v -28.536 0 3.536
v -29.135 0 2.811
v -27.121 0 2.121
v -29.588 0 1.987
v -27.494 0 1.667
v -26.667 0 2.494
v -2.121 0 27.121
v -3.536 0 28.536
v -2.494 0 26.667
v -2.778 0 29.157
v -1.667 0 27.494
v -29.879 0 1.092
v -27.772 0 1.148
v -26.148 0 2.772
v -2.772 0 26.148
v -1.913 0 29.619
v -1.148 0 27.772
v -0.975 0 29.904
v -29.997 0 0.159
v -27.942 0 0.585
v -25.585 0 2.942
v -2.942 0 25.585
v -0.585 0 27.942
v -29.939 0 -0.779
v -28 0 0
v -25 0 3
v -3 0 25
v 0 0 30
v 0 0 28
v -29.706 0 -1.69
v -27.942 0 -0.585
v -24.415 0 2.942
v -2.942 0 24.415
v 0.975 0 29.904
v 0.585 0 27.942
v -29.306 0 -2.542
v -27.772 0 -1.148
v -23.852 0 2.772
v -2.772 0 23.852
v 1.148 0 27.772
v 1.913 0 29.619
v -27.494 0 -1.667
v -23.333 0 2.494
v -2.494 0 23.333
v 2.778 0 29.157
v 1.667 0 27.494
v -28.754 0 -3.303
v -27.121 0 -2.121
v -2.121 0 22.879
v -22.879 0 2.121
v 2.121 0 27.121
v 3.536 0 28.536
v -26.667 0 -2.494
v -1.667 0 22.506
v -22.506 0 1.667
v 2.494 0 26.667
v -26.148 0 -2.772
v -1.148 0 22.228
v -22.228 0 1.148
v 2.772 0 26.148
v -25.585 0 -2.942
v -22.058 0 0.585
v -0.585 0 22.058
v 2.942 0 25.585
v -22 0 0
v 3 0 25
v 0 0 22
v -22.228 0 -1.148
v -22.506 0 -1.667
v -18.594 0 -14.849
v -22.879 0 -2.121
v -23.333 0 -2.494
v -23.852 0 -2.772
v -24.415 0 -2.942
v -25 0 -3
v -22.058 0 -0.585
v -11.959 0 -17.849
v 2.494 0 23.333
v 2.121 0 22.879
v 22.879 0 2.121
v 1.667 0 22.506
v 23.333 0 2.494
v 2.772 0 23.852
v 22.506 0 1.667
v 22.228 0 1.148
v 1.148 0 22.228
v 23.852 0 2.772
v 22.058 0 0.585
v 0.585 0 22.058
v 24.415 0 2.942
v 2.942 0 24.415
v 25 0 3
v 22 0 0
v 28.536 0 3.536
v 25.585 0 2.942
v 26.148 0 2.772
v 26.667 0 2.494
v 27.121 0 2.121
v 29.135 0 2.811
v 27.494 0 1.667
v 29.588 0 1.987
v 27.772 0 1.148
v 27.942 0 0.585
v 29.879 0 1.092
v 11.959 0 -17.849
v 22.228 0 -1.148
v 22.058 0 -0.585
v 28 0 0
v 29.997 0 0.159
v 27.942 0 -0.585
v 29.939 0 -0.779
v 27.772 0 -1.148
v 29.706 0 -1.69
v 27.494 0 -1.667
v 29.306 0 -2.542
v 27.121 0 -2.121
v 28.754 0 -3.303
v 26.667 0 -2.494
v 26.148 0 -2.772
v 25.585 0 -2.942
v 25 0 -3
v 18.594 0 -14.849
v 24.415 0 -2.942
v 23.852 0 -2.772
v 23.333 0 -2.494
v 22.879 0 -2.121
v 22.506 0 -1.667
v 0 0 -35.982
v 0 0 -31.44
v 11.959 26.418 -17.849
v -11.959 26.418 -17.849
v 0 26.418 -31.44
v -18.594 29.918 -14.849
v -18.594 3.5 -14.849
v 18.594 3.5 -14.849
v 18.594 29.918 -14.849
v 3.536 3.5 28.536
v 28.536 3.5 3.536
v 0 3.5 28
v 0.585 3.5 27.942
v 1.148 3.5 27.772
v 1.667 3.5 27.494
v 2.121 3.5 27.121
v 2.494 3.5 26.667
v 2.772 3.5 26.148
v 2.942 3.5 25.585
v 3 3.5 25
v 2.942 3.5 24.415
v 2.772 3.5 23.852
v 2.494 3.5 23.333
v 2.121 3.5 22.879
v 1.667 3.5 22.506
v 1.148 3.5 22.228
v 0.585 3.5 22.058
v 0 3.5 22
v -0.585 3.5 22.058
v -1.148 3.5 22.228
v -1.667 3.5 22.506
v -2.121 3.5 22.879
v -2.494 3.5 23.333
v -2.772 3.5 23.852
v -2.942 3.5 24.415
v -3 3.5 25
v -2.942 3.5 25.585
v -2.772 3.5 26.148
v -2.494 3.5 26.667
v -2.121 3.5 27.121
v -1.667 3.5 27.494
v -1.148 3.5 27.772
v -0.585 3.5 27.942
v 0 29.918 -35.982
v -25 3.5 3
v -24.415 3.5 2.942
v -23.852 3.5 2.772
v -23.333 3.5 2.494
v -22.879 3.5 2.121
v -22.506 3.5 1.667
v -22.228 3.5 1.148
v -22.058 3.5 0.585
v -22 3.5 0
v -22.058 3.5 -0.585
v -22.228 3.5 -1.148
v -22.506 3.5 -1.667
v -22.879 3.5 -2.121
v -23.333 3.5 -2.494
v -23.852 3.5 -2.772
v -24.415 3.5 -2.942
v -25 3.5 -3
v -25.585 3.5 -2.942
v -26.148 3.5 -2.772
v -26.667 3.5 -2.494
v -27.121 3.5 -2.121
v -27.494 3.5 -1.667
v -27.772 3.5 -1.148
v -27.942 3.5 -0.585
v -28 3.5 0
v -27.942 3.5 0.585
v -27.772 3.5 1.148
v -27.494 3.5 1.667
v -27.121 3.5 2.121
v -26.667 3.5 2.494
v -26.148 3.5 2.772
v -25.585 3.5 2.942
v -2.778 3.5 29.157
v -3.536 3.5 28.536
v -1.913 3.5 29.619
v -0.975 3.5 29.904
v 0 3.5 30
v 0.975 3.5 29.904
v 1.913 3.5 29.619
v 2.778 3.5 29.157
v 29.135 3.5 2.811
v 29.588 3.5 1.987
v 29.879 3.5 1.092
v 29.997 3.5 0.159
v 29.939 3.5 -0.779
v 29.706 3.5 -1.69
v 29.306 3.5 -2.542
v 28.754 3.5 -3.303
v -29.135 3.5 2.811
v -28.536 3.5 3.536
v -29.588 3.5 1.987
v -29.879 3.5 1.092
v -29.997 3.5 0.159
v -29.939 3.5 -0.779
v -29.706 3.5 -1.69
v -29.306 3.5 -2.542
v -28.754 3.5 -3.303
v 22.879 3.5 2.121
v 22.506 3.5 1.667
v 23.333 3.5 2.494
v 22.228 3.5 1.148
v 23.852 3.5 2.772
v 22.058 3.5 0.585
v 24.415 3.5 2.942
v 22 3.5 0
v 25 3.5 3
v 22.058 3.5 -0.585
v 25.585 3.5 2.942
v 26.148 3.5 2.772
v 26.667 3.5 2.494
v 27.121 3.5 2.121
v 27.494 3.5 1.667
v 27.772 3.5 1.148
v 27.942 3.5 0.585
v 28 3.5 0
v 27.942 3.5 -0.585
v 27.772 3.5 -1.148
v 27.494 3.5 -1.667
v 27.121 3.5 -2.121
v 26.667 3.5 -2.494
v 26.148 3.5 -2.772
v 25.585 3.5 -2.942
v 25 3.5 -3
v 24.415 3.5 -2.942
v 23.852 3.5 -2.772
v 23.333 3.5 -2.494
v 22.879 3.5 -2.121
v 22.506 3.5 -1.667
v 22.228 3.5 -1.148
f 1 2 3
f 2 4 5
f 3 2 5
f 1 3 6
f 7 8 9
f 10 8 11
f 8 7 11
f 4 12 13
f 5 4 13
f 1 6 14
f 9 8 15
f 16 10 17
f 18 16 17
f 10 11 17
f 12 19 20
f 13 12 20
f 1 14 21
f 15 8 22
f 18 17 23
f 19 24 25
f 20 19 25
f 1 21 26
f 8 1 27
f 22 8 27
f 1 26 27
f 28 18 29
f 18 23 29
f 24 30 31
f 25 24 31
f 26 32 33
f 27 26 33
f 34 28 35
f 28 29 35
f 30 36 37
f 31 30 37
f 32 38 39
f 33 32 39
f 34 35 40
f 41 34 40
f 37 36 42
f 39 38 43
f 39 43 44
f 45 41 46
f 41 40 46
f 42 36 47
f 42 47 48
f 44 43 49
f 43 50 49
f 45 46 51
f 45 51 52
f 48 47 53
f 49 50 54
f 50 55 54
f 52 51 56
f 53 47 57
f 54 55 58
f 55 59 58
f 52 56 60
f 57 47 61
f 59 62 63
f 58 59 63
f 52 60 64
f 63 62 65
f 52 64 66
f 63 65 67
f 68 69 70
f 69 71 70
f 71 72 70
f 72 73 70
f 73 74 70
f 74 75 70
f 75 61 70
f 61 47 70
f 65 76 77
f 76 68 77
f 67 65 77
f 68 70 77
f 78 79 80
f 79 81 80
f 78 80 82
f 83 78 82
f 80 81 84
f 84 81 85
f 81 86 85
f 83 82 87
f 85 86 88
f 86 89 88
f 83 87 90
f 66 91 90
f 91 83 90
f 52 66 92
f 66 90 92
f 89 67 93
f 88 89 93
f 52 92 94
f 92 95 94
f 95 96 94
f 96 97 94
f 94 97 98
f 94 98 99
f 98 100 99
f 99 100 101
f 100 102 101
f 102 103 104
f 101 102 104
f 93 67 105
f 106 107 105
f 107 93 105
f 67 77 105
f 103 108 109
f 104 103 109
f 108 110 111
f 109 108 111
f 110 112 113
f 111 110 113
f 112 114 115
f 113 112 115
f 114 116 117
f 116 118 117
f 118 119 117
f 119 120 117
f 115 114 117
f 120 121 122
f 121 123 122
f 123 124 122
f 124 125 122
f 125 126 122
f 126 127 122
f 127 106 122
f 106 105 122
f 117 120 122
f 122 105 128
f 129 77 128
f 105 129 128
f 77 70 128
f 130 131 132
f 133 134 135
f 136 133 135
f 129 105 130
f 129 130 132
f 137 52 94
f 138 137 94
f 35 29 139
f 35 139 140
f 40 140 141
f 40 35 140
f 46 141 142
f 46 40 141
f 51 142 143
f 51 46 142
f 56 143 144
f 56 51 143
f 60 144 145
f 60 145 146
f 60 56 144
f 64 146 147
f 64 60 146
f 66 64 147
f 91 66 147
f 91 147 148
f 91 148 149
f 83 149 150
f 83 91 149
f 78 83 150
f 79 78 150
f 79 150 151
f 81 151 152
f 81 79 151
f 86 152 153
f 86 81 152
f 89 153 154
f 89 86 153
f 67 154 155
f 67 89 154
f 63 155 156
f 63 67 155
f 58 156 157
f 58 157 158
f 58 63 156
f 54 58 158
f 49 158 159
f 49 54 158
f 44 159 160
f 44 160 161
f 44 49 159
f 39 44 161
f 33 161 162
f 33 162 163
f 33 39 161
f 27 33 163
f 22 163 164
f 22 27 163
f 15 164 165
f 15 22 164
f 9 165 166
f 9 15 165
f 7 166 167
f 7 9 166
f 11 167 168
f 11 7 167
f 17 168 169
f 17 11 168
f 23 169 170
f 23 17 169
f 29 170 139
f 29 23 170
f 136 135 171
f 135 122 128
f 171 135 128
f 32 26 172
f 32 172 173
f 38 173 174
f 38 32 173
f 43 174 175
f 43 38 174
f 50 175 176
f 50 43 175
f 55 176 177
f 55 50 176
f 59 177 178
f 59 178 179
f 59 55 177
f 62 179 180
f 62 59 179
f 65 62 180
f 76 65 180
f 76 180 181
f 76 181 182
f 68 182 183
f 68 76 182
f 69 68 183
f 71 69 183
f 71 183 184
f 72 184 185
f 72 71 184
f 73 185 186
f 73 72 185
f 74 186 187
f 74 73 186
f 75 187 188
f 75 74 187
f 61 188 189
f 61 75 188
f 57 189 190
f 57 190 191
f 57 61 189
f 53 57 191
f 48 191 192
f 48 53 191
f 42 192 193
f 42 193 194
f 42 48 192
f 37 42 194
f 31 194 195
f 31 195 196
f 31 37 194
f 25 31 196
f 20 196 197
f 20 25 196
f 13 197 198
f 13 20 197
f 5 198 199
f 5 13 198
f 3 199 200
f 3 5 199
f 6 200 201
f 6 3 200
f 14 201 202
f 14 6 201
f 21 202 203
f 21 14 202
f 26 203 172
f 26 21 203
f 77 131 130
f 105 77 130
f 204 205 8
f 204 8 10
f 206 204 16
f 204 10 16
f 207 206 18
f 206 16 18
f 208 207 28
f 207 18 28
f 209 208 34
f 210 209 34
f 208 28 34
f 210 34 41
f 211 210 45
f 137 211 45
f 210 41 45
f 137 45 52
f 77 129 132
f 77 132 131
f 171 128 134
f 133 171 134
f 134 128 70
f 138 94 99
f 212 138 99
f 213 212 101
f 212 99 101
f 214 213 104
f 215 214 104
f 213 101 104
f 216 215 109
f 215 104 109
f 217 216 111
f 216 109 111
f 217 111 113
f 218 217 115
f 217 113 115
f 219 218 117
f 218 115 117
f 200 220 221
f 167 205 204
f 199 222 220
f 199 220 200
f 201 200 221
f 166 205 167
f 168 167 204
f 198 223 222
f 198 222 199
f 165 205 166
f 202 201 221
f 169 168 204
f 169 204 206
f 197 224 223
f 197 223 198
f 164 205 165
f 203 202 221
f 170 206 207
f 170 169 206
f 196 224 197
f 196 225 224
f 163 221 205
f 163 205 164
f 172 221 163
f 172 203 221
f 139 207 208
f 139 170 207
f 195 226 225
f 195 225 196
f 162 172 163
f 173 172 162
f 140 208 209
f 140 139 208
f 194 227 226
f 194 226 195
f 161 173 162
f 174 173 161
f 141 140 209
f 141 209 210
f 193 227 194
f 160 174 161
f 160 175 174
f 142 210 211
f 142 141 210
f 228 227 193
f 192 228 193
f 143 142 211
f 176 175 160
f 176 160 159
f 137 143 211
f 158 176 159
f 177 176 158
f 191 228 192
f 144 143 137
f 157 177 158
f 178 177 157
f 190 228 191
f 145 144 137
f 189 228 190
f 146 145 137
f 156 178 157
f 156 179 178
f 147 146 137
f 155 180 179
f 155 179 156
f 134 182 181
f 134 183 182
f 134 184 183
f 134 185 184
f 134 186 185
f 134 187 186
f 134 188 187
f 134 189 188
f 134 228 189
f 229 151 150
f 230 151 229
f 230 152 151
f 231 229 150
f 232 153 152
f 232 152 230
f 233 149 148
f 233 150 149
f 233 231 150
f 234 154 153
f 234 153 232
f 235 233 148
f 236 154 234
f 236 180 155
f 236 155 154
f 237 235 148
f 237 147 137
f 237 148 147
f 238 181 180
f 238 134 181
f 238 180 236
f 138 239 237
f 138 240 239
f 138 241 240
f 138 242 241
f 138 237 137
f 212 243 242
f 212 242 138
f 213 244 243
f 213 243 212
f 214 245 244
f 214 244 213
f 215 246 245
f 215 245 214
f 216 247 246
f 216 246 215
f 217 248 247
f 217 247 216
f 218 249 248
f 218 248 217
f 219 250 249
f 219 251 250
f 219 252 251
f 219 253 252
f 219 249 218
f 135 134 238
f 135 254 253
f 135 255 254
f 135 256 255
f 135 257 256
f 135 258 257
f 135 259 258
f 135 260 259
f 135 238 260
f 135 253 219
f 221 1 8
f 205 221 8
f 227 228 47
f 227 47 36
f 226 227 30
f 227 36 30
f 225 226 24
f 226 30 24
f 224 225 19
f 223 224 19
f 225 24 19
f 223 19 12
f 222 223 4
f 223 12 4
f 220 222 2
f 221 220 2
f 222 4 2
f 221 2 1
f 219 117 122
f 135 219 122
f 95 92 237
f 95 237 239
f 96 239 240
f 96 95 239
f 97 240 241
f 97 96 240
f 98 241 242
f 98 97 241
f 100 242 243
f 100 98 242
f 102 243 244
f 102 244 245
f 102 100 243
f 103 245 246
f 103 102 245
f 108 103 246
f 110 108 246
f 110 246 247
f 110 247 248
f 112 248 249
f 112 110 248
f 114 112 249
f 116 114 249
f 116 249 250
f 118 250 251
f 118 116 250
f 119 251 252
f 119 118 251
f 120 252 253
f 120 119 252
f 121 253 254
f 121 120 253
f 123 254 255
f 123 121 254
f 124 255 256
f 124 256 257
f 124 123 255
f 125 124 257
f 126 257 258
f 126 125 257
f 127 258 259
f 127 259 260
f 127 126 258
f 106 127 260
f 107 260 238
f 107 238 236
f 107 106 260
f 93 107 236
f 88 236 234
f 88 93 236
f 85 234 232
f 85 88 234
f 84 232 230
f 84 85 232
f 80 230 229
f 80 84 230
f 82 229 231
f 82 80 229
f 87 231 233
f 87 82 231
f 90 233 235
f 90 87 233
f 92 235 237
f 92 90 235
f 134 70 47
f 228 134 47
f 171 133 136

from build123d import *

# Parameters (mm, degrees)
SKETCH1_R           = 3
BOSS_EXTRUDE1_DEPTH = 3.5
BOSS_EXTRUDE2_DEPTH = 29.918114598
CUT_EXTRUDE1_START  = -3.5
CUT_EXTRUDE1_DEPTH  = 28.5


with BuildPart() as part:
    # Sketch1 → Boss-Extrude1 (new body)
    with BuildSketch(Plane(origin=(0, 0, 0), x_dir=(1, 0, 0), z_dir=(0, 1, 0))):
        with BuildLine():
            ThreePointArc((-28.753774302, 3.302904553), (-29.997455721, -0.159487685), (-28.535533906, -3.535533906))
            Line((-28.535533906, -3.535533906), (-3.535533906, -28.535533906))
            ThreePointArc((-3.535533906, -28.535533906), (0, -30), (3.535533906, -28.535533906))
            Line((3.535533906, -28.535533906), (28.535533906, -3.535533906))
            ThreePointArc((28.535533906, -3.535533906), (29.997455721, -0.159487685), (28.753774302, 3.302904553))
            Line((28.753774302, 3.302904553), (0, 35.98177169))
            Line((0, 35.98177169), (-28.753774302, 3.302904553))
        make_face()
        with Locations((25, 0)):
            Circle(SKETCH1_R, mode=Mode.SUBTRACT)
        with Locations((0, -25)):
            Circle(SKETCH1_R, mode=Mode.SUBTRACT)
        with Locations((-25, 0)):
            Circle(SKETCH1_R, mode=Mode.SUBTRACT)
    extrude(amount=BOSS_EXTRUDE1_DEPTH)

    # Sketch1<3> → Boss-Extrude2 (add)
    with BuildSketch(Plane(origin=(0, 0, 0), x_dir=(1, 0, 0), z_dir=(0, 1, 0))):
        Polygon((0, 35.98177169), (-18.594331138, 14.849183308), (18.594331138, 14.849183308), align=None)
    extrude(amount=BOSS_EXTRUDE2_DEPTH)

    # Sketch3 → Cut-Extrude1 (cut)
    with BuildSketch(Plane(origin=(0, 29.918114598, 0), x_dir=(1, 0, 0), z_dir=(0, 1, 0)).offset(CUT_EXTRUDE1_START)):
        Polygon((11.958686143, 17.849183308), (0, 31.440314389), (-11.958686143, 17.849183308), align=None)
    extrude(amount=-CUT_EXTRUDE1_DEPTH, mode=Mode.SUBTRACT)


solid = part.part
